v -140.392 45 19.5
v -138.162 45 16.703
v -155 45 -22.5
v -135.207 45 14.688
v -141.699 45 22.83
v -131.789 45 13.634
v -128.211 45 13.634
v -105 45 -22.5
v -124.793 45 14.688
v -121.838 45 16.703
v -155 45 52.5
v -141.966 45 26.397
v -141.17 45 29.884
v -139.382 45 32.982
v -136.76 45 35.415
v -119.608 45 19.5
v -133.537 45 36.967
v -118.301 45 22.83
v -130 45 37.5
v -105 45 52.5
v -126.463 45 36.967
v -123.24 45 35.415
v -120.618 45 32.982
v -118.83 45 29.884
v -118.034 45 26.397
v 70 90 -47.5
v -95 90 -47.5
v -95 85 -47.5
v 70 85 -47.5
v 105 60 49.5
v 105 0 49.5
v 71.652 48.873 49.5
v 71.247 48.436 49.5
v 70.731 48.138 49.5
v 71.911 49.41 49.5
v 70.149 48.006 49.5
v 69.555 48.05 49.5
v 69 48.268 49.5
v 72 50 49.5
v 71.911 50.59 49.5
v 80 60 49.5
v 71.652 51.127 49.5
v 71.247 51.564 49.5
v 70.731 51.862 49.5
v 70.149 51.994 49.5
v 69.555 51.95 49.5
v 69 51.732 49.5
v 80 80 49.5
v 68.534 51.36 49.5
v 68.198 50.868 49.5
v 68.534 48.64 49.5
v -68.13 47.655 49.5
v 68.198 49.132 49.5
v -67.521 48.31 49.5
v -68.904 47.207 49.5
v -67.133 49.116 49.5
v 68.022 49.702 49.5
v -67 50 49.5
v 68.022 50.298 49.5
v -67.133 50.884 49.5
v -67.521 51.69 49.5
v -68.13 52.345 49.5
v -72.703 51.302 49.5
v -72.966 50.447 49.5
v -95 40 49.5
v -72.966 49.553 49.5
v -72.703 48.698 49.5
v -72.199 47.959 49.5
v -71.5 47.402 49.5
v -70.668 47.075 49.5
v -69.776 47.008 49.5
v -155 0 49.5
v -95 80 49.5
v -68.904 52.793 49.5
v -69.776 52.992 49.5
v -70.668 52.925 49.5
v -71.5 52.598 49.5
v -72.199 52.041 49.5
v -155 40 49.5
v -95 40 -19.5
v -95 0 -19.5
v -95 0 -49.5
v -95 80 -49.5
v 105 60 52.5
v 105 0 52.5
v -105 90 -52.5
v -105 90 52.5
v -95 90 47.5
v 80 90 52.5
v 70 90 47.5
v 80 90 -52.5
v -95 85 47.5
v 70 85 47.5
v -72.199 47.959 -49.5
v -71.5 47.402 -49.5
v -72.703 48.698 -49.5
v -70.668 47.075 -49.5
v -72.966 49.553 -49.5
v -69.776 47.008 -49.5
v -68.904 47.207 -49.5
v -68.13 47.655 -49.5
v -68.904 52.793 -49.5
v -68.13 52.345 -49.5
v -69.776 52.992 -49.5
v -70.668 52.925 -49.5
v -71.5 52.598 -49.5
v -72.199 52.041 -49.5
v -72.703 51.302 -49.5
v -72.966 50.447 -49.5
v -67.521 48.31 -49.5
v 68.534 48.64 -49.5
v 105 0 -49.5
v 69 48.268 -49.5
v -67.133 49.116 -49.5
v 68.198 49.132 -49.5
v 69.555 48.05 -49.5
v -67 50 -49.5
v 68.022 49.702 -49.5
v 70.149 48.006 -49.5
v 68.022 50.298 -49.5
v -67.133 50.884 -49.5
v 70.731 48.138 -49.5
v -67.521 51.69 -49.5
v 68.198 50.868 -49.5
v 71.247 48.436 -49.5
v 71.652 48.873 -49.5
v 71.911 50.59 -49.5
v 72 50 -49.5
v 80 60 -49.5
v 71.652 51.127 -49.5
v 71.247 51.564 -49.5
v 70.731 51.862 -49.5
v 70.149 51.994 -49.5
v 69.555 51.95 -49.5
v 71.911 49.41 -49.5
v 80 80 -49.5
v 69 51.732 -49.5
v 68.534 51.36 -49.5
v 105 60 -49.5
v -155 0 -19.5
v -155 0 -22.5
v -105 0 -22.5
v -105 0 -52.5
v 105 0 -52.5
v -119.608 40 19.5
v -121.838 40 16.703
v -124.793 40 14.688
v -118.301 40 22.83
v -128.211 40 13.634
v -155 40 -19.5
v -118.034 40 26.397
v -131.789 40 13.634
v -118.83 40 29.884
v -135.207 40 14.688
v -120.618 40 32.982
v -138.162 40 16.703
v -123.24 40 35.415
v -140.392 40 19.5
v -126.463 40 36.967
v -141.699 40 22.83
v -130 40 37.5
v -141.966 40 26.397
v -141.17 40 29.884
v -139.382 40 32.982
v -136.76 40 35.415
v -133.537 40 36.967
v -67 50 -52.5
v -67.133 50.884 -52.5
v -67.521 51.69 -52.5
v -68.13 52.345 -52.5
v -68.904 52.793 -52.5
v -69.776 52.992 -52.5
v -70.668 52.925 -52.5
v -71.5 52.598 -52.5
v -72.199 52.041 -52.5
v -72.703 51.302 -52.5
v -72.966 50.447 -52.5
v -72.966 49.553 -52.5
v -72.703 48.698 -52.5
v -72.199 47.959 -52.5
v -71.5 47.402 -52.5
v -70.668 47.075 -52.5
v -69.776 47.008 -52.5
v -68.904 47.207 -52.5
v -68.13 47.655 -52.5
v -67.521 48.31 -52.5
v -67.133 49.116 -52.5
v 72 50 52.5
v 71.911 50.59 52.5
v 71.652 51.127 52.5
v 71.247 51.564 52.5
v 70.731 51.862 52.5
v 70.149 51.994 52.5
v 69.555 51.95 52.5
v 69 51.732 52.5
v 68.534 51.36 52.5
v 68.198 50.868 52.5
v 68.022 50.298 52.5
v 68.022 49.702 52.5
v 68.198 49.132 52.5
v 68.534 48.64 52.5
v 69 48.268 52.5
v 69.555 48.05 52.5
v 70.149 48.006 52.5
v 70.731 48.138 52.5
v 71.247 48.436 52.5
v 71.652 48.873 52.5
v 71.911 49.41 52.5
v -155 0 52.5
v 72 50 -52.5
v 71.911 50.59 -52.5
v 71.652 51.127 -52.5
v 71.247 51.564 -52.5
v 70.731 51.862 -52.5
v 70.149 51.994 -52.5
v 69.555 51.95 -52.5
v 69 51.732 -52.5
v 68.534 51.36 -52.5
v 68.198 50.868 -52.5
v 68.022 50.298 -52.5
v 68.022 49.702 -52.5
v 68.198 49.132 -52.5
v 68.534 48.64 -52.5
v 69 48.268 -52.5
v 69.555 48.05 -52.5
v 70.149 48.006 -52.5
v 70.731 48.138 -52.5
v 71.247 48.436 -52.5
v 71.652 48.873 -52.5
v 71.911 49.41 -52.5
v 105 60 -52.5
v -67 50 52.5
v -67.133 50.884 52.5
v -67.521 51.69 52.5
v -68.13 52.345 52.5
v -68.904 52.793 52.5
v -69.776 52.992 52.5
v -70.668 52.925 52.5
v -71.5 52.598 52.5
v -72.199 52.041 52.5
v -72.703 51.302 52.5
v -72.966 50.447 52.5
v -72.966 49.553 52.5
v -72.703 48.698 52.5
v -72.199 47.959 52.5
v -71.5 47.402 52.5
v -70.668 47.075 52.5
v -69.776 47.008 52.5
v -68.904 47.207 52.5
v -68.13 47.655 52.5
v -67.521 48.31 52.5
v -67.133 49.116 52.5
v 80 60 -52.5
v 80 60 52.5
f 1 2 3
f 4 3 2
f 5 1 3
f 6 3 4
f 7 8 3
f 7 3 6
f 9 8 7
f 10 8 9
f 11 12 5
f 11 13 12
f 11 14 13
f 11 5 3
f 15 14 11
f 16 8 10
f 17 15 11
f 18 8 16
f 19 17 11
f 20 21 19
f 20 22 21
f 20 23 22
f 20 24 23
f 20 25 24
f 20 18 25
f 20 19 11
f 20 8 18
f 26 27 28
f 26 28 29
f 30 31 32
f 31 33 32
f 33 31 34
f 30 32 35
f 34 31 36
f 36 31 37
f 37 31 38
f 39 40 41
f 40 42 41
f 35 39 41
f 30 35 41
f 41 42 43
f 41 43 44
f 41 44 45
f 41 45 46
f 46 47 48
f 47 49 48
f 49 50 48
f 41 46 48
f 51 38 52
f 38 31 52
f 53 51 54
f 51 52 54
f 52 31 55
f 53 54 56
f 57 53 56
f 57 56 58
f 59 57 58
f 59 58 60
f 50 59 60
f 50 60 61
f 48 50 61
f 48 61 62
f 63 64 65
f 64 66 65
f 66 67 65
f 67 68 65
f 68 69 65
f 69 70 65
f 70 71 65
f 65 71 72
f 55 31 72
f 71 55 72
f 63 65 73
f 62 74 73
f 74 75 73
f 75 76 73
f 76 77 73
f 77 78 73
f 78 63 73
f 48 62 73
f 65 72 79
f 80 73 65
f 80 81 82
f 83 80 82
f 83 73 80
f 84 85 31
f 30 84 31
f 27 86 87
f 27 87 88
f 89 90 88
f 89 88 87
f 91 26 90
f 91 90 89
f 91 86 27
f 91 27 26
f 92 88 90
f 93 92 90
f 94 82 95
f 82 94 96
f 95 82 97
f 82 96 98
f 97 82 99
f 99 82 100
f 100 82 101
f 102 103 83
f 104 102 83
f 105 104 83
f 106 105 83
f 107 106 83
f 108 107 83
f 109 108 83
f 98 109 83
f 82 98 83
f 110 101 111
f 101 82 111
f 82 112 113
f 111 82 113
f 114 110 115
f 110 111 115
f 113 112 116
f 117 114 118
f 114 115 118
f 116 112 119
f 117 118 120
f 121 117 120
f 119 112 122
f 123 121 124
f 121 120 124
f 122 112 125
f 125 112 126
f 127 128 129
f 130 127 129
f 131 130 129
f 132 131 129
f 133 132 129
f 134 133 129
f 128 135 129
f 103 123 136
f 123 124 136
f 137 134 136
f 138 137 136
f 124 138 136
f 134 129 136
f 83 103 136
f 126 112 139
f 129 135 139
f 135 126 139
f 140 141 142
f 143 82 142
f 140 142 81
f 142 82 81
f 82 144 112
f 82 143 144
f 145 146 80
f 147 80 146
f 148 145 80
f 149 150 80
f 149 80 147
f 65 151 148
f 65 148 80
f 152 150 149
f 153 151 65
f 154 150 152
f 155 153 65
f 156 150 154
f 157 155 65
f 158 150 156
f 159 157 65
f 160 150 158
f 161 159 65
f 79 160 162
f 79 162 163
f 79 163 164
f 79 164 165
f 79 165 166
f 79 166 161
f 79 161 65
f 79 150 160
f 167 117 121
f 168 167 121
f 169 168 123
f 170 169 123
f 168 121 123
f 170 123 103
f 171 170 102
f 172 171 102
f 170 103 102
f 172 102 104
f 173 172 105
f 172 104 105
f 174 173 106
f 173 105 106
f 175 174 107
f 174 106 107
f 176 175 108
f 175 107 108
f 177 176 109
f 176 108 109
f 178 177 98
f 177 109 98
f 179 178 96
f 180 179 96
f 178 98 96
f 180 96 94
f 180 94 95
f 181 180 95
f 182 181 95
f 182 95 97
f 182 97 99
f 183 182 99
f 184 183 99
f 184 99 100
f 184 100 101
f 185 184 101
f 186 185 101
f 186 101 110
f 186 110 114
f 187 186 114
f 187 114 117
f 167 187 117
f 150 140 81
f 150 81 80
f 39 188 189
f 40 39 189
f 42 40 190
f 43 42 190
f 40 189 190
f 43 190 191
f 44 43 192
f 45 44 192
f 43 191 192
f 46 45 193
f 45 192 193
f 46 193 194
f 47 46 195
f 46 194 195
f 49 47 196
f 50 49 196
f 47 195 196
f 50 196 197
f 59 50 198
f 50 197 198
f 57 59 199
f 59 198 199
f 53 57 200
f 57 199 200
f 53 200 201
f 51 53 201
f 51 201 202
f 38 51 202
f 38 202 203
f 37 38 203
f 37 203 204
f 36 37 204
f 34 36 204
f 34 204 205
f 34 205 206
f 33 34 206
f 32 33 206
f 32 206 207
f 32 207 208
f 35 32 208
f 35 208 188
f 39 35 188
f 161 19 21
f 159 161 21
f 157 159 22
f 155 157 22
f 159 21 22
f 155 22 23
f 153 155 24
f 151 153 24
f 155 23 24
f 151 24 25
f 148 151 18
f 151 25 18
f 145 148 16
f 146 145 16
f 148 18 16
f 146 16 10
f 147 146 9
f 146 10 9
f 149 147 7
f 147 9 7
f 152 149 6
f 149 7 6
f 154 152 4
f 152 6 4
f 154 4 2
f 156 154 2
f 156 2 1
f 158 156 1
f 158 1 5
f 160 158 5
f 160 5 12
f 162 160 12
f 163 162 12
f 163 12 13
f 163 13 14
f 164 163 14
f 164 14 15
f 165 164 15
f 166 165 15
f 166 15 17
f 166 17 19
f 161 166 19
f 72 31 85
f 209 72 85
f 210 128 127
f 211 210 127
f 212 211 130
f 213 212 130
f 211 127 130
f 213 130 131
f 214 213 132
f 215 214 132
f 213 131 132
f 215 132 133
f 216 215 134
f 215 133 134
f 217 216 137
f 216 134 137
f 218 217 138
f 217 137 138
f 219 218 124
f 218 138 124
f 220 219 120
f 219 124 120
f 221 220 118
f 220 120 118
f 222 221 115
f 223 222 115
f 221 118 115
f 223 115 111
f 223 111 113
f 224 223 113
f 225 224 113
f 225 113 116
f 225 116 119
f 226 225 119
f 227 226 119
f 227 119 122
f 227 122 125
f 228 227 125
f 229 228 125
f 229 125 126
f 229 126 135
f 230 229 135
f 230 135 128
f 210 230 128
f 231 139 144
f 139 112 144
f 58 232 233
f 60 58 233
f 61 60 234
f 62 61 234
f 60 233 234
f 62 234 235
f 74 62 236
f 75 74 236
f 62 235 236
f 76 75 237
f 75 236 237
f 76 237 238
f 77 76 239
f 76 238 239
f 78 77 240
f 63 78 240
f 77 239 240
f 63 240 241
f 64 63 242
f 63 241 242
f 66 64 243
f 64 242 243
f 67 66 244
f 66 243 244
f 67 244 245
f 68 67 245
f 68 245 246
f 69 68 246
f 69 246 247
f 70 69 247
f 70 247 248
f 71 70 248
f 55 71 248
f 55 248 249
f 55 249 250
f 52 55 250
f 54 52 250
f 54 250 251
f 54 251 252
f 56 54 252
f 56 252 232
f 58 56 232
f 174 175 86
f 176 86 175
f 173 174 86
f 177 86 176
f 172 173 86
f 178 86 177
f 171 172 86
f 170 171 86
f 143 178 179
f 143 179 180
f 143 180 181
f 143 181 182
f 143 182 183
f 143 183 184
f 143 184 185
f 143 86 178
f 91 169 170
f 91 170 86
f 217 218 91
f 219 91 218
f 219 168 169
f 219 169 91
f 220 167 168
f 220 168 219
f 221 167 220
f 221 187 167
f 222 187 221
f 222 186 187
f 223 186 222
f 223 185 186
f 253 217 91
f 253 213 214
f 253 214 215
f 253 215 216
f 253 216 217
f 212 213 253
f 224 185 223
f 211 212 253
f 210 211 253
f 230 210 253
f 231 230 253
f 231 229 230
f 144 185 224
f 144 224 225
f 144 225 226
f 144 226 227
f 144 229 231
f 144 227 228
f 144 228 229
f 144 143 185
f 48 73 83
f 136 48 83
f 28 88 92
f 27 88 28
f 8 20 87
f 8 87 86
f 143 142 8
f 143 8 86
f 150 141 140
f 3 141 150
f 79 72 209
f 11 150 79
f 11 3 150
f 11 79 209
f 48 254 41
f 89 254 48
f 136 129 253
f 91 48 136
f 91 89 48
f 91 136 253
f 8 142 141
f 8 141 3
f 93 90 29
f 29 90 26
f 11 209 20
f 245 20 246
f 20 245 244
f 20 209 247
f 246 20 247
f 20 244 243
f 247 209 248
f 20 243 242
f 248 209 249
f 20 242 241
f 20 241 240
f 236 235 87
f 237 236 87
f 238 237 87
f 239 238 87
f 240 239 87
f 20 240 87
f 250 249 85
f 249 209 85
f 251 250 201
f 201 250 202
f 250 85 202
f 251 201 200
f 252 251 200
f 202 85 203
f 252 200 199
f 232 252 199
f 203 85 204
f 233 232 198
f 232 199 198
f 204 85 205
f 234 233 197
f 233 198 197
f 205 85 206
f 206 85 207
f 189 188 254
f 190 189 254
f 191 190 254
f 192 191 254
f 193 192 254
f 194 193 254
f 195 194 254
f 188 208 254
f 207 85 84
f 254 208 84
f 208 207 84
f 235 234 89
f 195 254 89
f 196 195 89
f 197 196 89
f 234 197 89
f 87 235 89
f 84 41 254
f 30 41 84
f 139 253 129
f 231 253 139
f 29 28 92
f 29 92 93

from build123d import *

# Parameters (mm, degrees)
SKETCH_2_W          = 210
SKETCH_2_H          = 105
EXTRUDE_1_DEPTH     = 90
SKETCH_4_W          = 165
SKETCH_4_H          = 95
CUT_EXTRUDE_1_DEPTH = 5
SKETCH_5_W          = 99
SKETCH_5_H          = 80
CUT_EXTRUDE_2_DEPTH = 200
SKETCH_6_W          = 75
SKETCH_6_H          = 45
EXTRUDE_2_DEPTH     = 50
SKETCH_7_W          = 69
SKETCH_7_H          = 40
CUT_EXTRUDE_3_DEPTH = 281.100428418
SKETCH_8_R          = 12
CUT_EXTRUDE_4_DEPTH = 170.724040725
SKETCH_9_R          = 3
SKETCH_9_R_2        = 2
CUT_EXTRUDE_5_DEPTH = 208.725780778
SKETCH_11_W         = 25
SKETCH_11_H         = 105
CUT_EXTRUDE_6_DEPTH = 30


with BuildPart() as part:
    # 草图2 → 凸台-拉伸1 (new body)
    with BuildSketch(Plane(origin=(0, 0, 0), x_dir=(1, 0, 0), z_dir=(0, 1, 0))):
        Rectangle(SKETCH_2_W, SKETCH_2_H)
    extrude(amount=EXTRUDE_1_DEPTH)

    # 草图4 → 切除-拉伸1 (cut)
    with BuildSketch(Plane(origin=(0, 90, 0), x_dir=(1, 0, 0), z_dir=(0, 1, 0))):
        with Locations((-12.5, 0)):
            Rectangle(SKETCH_4_W, SKETCH_4_H)
    extrude(amount=-CUT_EXTRUDE_1_DEPTH, mode=Mode.SUBTRACT)

    # 草图5 → 切除-拉伸2 (cut)
    with BuildSketch(Plane(origin=(105, 0, 0), x_dir=(0, 0, -1), z_dir=(1, 0, 0))):
        with Locations((0, 40)):
            Rectangle(SKETCH_5_W, SKETCH_5_H)
    extrude(amount=-CUT_EXTRUDE_2_DEPTH, mode=Mode.SUBTRACT)

    # 草图6 → 凸台-拉伸2 (add)
    with BuildSketch(Plane.ZY.offset(105)):
        with Locations((15, 22.5)):
            Rectangle(SKETCH_6_W, SKETCH_6_H)
    extrude(amount=EXTRUDE_2_DEPTH)

    # 草图7 → 切除-拉伸3 (cut, through all)
    with BuildSketch(Plane.ZY.offset(155)):
        with Locations((15, 20)):
            Rectangle(SKETCH_7_W, SKETCH_7_H)
    extrude(amount=-CUT_EXTRUDE_3_DEPTH, mode=Mode.SUBTRACT)

    # 草图8 → 切除-拉伸4 (cut, through all)
    with BuildSketch(Plane(origin=(0, 45, 0), x_dir=(1, 0, 0), z_dir=(0, 1, 0))):
        with Locations(Location((-130, -25.5, 0), (0, 0, 270))):
            Circle(SKETCH_8_R)
    extrude(amount=-CUT_EXTRUDE_4_DEPTH, mode=Mode.SUBTRACT)

    # 草图9 → 切除-拉伸5 (cut, through all)
    with BuildSketch(Plane.XY.offset(52.5)):
        with Locations((-70, 50)):
            Circle(SKETCH_9_R)
        with Locations((70, 50)):
            Circle(SKETCH_9_R_2)
    extrude(amount=-CUT_EXTRUDE_5_DEPTH, mode=Mode.SUBTRACT)

    # 草图11 → 切除-拉伸6 (cut)
    with BuildSketch(Plane(origin=(0, 90, 0), x_dir=(1, 0, 0), z_dir=(0, 1, 0))):
        with Locations((92.5, 0)):
            Rectangle(SKETCH_11_W, SKETCH_11_H)
    extrude(amount=-CUT_EXTRUDE_6_DEPTH, mode=Mode.SUBTRACT)


solid = part.part
